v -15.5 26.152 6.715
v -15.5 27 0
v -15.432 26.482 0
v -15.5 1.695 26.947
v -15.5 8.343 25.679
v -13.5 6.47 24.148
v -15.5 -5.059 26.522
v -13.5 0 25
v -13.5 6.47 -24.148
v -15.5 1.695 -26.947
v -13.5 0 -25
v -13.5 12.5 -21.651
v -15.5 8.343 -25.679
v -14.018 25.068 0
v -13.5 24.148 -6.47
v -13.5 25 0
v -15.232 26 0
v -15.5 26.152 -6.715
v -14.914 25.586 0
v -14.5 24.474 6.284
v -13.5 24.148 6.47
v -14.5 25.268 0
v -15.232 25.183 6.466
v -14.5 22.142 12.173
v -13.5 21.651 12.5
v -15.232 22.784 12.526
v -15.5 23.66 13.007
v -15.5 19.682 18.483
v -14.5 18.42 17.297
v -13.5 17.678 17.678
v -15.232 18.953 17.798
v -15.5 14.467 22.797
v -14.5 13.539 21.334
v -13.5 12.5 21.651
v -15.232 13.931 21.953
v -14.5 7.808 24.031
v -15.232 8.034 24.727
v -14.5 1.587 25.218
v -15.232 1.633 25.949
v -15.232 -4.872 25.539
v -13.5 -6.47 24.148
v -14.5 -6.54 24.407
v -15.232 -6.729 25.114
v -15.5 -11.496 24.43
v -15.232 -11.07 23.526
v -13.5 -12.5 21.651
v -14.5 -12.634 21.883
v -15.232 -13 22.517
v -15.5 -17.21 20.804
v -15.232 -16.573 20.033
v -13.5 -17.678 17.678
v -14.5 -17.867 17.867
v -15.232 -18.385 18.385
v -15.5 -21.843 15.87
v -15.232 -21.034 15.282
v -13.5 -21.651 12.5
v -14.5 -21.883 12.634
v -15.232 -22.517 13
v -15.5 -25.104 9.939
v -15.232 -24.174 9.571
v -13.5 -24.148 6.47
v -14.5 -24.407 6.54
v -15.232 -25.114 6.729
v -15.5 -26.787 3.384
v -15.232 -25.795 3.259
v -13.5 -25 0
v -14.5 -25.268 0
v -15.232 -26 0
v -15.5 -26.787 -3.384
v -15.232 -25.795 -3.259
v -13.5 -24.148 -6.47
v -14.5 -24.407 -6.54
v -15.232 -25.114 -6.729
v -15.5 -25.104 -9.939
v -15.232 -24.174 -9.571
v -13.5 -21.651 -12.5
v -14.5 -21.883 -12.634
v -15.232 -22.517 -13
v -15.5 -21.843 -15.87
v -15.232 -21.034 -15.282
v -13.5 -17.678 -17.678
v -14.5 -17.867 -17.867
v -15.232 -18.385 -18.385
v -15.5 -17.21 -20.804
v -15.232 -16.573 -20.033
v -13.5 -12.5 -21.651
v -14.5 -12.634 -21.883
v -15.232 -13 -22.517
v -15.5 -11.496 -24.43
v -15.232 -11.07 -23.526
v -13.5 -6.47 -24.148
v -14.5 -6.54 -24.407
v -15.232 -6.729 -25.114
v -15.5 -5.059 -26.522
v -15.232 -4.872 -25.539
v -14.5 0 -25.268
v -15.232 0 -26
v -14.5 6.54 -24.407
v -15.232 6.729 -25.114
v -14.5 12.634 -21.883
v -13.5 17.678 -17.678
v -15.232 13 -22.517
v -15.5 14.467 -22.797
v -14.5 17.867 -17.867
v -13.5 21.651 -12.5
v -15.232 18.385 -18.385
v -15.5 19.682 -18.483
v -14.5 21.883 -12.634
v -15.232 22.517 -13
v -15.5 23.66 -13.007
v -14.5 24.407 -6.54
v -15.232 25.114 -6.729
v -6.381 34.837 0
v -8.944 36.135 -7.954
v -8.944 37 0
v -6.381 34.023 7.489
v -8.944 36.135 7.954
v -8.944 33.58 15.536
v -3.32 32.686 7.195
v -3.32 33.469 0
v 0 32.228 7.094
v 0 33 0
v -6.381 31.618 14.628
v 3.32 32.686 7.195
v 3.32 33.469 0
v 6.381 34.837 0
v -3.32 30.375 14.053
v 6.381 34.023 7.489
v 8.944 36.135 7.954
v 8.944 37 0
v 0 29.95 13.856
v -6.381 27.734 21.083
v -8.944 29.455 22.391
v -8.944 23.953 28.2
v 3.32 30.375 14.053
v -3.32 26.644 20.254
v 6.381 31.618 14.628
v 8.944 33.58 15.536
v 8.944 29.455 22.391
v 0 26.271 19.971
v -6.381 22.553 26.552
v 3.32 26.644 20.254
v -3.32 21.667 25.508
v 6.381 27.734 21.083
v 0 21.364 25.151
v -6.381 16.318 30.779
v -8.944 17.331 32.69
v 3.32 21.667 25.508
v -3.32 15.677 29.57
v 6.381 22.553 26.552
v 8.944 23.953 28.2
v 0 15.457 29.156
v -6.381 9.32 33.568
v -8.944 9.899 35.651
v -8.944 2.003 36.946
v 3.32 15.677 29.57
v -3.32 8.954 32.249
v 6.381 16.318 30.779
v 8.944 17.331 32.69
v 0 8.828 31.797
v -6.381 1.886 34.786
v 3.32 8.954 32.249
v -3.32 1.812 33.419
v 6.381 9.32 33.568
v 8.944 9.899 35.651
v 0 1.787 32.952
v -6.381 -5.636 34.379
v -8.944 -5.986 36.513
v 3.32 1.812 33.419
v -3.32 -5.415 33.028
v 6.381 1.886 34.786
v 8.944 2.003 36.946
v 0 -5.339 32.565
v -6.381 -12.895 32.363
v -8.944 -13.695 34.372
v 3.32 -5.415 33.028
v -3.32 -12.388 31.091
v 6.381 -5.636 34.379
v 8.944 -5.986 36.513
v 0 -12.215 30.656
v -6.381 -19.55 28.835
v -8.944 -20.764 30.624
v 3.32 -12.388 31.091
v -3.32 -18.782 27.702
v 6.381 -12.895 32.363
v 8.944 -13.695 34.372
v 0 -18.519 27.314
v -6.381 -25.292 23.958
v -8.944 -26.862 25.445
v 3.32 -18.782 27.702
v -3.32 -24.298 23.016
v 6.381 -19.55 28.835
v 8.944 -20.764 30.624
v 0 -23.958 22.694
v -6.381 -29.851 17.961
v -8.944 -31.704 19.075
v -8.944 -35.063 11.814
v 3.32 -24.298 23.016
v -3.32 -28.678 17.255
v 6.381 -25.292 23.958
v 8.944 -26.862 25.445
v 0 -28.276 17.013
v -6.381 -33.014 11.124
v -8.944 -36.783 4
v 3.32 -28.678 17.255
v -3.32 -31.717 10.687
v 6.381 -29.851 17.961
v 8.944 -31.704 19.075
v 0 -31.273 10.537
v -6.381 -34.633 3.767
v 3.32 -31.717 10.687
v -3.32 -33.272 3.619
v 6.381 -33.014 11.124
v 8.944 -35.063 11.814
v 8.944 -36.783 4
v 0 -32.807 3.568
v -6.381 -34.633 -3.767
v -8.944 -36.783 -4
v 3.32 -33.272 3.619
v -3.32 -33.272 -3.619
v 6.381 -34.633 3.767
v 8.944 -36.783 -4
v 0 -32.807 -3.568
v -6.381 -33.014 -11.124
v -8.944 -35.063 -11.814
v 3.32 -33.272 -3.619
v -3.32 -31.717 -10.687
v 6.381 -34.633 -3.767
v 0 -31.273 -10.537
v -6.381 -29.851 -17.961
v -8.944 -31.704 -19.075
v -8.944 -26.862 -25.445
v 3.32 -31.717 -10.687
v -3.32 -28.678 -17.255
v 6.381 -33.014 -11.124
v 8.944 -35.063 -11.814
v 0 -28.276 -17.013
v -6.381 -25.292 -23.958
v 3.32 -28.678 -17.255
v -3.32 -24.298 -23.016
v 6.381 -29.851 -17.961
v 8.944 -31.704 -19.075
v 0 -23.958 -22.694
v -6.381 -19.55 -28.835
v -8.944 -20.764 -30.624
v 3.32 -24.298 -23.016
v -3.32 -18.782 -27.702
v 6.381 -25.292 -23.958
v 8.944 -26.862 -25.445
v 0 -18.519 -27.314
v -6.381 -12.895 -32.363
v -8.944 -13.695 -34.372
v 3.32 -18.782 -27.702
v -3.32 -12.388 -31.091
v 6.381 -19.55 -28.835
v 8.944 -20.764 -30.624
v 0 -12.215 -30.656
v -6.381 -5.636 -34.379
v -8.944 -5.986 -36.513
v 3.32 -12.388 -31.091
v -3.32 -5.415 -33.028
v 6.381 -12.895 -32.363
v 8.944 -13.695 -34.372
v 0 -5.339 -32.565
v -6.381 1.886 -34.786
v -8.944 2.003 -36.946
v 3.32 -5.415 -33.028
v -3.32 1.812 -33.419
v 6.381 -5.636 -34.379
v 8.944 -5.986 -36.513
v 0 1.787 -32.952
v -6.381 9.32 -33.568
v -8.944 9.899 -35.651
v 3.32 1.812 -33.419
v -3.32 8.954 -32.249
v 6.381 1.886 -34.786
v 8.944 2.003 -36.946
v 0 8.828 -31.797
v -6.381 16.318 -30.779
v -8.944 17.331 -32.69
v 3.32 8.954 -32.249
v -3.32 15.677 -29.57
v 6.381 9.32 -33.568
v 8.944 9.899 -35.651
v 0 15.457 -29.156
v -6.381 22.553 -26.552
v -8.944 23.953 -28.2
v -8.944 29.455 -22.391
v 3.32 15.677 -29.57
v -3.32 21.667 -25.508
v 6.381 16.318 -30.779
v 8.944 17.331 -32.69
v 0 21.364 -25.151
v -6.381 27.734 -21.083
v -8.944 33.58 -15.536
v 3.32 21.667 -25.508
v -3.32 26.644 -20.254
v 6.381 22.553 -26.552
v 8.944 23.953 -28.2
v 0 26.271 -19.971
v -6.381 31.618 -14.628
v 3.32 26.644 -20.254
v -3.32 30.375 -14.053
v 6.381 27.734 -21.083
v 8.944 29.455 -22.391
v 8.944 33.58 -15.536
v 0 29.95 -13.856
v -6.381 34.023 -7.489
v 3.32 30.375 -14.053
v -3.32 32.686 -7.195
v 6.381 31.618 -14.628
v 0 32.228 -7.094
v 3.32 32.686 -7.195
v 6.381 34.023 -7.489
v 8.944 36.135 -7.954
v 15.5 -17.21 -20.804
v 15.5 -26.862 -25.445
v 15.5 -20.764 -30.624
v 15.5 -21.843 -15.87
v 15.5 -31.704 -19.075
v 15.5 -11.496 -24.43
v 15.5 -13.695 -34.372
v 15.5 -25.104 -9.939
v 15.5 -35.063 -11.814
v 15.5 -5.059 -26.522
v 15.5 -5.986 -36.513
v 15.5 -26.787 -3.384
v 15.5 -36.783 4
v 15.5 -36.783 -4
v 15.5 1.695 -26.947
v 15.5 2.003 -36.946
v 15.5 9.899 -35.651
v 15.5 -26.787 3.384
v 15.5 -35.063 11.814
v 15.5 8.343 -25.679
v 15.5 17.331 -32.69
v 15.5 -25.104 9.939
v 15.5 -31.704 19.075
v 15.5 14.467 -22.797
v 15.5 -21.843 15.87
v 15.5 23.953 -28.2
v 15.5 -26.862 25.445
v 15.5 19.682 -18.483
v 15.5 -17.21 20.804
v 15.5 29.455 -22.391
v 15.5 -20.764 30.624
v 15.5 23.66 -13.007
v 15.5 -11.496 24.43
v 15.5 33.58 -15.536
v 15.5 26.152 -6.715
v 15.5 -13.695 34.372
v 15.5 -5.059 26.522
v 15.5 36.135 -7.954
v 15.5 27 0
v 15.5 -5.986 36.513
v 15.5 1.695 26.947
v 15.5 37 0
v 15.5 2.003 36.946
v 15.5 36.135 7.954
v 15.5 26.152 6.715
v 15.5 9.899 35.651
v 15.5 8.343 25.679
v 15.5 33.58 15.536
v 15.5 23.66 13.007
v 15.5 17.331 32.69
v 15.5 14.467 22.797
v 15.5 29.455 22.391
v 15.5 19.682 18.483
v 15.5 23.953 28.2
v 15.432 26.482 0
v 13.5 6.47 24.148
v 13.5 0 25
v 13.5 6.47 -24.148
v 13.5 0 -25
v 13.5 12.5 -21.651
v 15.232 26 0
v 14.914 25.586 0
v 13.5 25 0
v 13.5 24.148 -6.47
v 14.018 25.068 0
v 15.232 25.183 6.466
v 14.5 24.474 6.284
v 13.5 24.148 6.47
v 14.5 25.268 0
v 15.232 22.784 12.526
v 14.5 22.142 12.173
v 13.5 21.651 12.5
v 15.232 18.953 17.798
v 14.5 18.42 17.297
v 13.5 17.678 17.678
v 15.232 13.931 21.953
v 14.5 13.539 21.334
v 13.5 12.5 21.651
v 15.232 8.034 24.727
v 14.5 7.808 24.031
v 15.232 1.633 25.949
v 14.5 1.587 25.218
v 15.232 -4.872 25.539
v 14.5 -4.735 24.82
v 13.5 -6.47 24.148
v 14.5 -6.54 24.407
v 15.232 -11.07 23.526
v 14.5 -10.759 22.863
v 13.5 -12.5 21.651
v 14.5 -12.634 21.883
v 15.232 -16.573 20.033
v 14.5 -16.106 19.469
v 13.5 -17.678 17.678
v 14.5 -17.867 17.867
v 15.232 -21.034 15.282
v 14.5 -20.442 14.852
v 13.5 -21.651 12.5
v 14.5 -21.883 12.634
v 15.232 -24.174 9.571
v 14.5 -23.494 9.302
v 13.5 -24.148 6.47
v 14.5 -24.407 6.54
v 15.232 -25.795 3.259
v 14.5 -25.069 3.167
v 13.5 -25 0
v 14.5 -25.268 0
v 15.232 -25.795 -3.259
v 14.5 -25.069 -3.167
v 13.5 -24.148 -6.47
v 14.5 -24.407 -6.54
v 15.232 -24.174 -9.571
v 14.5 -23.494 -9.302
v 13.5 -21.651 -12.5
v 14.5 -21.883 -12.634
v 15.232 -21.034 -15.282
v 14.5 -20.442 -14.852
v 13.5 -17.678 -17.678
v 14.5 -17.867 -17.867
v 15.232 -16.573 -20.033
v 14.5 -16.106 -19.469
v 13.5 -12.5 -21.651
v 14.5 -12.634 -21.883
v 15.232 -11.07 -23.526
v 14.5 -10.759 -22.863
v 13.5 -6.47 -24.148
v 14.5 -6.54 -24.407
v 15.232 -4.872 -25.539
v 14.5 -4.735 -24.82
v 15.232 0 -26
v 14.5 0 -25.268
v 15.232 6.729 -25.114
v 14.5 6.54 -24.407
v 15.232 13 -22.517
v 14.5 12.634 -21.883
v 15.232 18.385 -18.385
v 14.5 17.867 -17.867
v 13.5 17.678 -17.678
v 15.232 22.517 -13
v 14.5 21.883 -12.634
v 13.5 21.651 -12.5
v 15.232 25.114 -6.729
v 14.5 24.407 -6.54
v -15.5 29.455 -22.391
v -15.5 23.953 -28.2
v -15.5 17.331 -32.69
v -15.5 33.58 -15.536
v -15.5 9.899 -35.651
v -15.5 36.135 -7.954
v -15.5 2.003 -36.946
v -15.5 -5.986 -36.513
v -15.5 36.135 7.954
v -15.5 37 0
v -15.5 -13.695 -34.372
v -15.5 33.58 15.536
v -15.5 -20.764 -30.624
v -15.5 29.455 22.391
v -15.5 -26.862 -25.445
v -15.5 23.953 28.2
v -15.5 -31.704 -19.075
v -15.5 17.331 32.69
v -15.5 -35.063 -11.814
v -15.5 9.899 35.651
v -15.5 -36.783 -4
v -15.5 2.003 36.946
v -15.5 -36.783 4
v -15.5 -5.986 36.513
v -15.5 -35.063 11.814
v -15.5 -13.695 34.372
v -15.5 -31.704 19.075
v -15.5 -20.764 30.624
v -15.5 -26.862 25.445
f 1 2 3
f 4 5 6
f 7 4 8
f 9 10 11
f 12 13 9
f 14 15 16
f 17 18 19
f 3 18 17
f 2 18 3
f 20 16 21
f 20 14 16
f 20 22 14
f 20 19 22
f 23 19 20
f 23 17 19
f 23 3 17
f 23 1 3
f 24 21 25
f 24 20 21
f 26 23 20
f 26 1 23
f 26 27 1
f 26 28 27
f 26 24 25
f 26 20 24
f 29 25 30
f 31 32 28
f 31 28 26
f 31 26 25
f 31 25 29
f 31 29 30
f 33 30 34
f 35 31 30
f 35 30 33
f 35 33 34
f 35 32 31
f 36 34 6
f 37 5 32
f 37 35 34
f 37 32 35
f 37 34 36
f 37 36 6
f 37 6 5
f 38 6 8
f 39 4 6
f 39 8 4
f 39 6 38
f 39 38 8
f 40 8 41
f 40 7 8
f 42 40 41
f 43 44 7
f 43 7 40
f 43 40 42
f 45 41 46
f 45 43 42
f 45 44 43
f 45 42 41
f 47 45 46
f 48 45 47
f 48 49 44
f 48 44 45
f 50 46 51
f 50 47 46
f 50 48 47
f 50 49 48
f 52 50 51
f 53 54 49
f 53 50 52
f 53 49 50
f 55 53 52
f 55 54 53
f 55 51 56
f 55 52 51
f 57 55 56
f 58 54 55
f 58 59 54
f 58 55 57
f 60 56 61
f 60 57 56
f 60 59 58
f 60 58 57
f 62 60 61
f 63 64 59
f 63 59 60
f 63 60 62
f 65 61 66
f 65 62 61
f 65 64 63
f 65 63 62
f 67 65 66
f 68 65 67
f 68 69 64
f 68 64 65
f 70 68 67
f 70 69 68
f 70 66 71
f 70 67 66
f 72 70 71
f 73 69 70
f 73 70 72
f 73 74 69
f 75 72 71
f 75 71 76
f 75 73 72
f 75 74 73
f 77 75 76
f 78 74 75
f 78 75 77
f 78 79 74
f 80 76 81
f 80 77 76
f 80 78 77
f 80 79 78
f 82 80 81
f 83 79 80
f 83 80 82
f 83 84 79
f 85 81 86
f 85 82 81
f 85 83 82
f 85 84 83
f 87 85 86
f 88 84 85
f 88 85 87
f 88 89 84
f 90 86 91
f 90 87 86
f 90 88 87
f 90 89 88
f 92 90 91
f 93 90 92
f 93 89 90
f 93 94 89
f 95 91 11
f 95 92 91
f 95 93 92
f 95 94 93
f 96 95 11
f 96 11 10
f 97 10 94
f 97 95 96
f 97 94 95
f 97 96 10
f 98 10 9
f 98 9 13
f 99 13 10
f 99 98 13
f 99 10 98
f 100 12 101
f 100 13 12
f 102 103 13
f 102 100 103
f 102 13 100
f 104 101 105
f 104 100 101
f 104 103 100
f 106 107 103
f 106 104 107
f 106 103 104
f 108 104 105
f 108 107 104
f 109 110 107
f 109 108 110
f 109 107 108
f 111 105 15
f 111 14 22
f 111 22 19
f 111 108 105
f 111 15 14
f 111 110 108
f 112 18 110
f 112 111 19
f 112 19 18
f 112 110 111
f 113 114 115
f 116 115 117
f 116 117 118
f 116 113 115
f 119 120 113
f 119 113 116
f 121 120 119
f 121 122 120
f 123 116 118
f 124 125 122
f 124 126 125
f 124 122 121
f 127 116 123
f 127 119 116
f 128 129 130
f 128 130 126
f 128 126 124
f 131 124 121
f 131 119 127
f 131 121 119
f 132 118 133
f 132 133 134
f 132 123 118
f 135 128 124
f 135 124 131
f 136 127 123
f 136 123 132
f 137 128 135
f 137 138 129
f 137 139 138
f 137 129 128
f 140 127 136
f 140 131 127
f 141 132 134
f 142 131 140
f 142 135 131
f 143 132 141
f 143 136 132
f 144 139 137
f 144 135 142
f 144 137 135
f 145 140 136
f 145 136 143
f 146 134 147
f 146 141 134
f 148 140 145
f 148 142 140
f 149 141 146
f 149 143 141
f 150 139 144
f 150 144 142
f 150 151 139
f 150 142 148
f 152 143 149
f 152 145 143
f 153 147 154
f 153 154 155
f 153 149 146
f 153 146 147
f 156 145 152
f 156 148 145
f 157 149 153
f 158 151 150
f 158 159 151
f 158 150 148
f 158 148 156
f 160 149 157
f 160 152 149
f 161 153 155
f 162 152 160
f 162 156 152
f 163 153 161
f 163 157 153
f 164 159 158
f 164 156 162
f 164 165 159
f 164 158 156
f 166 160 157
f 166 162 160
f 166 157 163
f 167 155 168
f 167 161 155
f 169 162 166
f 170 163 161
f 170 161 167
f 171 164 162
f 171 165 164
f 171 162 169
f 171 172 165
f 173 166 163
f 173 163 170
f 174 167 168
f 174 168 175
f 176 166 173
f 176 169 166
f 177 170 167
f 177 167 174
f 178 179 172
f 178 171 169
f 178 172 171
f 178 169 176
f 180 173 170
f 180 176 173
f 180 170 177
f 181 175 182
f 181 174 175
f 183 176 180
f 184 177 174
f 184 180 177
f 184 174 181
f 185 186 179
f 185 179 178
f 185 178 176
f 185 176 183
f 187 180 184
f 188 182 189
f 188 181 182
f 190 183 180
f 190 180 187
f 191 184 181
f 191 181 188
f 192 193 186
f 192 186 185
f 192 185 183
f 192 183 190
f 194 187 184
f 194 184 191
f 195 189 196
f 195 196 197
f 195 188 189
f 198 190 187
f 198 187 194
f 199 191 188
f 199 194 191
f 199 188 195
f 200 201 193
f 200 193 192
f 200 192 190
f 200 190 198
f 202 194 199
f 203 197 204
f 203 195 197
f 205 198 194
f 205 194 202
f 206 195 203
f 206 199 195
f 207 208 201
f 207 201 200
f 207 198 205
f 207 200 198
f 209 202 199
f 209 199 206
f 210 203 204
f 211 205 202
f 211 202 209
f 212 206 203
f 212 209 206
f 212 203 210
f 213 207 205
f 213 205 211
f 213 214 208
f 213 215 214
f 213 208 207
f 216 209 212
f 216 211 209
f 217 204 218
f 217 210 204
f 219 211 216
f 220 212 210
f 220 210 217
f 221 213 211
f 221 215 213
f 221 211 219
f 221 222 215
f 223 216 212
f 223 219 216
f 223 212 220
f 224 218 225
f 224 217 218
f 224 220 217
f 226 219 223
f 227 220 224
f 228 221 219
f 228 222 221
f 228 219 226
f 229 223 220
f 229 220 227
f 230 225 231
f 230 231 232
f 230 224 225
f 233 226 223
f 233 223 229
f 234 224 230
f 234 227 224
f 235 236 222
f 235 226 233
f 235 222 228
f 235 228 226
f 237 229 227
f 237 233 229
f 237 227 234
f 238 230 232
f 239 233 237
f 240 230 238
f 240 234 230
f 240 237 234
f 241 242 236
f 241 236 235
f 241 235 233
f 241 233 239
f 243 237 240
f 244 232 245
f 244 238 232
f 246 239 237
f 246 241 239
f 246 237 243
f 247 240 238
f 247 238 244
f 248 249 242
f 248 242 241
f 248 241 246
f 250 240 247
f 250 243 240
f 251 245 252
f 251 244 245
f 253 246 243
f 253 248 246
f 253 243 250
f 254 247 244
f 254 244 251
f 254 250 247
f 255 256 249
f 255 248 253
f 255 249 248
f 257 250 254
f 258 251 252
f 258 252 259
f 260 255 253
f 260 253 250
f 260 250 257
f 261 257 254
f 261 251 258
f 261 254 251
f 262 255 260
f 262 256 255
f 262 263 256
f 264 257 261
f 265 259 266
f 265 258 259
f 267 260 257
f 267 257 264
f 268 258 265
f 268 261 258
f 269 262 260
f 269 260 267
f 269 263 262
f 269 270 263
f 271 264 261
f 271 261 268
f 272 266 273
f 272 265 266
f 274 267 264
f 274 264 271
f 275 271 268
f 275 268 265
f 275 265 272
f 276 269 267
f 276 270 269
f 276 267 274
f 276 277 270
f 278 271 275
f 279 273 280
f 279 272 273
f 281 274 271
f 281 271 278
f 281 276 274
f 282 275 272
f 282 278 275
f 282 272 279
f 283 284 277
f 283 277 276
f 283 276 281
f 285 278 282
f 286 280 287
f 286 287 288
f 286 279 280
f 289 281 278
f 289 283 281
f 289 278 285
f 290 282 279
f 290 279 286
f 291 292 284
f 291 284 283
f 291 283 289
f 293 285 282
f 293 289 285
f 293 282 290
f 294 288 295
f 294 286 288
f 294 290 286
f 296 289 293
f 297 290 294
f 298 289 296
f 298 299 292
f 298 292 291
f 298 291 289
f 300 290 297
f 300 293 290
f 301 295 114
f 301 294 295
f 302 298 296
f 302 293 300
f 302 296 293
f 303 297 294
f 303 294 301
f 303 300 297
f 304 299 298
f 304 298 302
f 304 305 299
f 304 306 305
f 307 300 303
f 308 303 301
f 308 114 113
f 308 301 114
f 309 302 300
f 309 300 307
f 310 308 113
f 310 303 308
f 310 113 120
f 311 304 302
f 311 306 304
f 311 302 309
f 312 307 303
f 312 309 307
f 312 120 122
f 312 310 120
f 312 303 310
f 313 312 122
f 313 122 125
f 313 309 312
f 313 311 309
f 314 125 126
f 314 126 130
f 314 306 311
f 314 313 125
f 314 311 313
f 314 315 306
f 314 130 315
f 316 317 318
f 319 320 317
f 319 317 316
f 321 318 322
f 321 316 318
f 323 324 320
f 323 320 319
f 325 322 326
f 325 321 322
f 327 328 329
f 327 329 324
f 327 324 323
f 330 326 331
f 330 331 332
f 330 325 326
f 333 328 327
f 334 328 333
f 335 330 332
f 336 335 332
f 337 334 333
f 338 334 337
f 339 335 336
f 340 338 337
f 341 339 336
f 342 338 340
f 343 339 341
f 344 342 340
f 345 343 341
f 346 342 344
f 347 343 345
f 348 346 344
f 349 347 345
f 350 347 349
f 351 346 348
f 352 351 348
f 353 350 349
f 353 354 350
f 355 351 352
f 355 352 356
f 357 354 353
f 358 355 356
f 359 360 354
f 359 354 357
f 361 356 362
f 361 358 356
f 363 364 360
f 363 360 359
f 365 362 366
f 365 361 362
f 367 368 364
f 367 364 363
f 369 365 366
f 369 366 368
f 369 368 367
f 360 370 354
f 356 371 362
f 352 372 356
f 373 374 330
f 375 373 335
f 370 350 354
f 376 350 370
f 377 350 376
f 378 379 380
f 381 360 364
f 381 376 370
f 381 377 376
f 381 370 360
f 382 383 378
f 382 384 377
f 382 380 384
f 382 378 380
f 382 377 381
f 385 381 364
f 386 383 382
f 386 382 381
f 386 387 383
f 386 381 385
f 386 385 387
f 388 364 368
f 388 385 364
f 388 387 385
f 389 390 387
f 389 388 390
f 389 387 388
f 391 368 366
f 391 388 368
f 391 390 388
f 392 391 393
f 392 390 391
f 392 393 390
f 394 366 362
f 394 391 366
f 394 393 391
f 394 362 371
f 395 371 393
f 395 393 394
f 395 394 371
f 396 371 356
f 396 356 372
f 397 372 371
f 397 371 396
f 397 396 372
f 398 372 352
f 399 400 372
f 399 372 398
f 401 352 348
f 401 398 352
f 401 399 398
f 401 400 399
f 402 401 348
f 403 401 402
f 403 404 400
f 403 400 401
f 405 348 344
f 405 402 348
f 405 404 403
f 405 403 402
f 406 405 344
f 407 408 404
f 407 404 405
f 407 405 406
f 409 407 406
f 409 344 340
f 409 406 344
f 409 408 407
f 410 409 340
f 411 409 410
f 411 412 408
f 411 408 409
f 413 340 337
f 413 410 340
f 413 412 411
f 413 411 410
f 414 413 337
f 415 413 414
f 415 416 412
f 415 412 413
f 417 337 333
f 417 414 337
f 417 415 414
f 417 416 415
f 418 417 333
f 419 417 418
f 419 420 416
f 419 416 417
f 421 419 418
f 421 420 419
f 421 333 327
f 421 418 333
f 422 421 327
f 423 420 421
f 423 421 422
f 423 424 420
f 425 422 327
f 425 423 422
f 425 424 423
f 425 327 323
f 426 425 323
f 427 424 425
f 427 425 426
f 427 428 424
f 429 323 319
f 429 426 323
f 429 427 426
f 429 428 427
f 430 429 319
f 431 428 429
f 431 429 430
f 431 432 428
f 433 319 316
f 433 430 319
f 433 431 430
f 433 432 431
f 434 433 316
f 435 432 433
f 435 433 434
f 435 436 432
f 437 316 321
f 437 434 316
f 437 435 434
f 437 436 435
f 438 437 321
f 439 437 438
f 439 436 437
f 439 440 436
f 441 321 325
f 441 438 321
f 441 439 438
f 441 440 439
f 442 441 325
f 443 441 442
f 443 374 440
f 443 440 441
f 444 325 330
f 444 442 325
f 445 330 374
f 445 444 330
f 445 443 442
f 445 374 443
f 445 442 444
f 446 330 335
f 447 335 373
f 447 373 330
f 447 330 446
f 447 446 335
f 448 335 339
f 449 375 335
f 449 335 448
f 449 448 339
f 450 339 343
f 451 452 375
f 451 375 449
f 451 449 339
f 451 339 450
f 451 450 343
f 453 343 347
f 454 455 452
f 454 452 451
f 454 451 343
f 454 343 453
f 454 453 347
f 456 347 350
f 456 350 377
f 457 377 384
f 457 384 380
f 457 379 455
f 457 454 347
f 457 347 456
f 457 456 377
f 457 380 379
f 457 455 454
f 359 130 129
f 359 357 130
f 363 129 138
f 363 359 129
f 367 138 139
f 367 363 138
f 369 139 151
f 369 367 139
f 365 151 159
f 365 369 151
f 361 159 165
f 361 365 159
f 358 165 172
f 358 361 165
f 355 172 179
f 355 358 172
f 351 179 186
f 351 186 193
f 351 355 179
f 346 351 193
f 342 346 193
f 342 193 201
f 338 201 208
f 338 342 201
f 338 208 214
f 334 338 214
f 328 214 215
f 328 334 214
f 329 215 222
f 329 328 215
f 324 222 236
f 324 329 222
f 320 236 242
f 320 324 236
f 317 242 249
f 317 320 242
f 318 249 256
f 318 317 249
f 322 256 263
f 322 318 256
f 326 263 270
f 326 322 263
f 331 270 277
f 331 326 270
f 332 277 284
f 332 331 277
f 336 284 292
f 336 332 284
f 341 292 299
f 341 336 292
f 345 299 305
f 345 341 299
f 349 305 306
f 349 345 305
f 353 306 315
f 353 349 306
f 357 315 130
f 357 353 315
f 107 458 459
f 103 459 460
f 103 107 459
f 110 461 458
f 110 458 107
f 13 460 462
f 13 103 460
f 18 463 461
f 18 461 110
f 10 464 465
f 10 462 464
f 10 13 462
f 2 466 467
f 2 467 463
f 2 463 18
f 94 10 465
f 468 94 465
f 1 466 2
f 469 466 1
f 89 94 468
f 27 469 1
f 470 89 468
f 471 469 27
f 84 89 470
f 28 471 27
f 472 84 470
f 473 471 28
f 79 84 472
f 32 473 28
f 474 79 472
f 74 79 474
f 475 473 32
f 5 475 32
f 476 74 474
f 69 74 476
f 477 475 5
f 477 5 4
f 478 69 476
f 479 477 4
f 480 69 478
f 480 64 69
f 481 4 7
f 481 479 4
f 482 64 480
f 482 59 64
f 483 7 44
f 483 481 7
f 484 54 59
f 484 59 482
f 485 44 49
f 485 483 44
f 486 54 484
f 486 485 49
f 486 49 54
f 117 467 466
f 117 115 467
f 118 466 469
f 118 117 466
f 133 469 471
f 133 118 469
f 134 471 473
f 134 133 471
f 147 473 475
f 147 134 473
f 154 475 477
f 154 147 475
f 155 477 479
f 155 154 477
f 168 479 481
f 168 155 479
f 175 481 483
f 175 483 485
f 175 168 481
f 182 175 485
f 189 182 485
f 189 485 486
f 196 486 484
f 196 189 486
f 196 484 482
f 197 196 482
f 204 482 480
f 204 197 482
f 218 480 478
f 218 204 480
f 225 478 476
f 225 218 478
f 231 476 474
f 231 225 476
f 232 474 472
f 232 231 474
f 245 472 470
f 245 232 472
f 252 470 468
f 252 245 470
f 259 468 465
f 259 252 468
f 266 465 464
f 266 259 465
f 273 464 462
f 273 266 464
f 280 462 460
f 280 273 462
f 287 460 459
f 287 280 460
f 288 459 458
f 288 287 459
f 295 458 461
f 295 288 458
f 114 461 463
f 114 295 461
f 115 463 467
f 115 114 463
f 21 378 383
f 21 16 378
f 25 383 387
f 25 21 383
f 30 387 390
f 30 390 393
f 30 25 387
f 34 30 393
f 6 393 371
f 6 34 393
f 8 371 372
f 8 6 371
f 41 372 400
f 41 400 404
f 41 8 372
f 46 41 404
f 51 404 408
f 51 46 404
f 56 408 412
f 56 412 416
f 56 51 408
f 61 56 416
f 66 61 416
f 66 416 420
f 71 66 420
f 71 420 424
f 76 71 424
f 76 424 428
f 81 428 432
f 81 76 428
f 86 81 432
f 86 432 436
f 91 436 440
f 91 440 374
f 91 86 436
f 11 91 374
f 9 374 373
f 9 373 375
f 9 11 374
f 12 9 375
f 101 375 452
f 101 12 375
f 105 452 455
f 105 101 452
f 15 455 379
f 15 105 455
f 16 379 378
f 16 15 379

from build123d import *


with BuildPart() as part:
    # Sketch1 → Revolve1 (revolve)
    with BuildSketch(Plane.XY):
        with BuildLine():
            Line((13.5, 25), (-13.5, 25))
            ThreePointArc((-13.5, 25), (-14.914213562, 25.585786438), (-15.5, 27))
            Line((-15.5, 27), (-15.5, 37))
            Line((-15.5, 37), (-8.94427191, 37))
            ThreePointArc((-8.94427191, 37), (0, 33), (8.94427191, 37))
            Line((8.94427191, 37), (15.5, 37))
            Line((15.5, 37), (15.5, 27))
            ThreePointArc((15.5, 27), (14.914213562, 25.585786438), (13.5, 25))
        make_face()
    revolve(axis=Axis((-15.5, 0, 0), (1, 0, 0)))


solid = part.part
